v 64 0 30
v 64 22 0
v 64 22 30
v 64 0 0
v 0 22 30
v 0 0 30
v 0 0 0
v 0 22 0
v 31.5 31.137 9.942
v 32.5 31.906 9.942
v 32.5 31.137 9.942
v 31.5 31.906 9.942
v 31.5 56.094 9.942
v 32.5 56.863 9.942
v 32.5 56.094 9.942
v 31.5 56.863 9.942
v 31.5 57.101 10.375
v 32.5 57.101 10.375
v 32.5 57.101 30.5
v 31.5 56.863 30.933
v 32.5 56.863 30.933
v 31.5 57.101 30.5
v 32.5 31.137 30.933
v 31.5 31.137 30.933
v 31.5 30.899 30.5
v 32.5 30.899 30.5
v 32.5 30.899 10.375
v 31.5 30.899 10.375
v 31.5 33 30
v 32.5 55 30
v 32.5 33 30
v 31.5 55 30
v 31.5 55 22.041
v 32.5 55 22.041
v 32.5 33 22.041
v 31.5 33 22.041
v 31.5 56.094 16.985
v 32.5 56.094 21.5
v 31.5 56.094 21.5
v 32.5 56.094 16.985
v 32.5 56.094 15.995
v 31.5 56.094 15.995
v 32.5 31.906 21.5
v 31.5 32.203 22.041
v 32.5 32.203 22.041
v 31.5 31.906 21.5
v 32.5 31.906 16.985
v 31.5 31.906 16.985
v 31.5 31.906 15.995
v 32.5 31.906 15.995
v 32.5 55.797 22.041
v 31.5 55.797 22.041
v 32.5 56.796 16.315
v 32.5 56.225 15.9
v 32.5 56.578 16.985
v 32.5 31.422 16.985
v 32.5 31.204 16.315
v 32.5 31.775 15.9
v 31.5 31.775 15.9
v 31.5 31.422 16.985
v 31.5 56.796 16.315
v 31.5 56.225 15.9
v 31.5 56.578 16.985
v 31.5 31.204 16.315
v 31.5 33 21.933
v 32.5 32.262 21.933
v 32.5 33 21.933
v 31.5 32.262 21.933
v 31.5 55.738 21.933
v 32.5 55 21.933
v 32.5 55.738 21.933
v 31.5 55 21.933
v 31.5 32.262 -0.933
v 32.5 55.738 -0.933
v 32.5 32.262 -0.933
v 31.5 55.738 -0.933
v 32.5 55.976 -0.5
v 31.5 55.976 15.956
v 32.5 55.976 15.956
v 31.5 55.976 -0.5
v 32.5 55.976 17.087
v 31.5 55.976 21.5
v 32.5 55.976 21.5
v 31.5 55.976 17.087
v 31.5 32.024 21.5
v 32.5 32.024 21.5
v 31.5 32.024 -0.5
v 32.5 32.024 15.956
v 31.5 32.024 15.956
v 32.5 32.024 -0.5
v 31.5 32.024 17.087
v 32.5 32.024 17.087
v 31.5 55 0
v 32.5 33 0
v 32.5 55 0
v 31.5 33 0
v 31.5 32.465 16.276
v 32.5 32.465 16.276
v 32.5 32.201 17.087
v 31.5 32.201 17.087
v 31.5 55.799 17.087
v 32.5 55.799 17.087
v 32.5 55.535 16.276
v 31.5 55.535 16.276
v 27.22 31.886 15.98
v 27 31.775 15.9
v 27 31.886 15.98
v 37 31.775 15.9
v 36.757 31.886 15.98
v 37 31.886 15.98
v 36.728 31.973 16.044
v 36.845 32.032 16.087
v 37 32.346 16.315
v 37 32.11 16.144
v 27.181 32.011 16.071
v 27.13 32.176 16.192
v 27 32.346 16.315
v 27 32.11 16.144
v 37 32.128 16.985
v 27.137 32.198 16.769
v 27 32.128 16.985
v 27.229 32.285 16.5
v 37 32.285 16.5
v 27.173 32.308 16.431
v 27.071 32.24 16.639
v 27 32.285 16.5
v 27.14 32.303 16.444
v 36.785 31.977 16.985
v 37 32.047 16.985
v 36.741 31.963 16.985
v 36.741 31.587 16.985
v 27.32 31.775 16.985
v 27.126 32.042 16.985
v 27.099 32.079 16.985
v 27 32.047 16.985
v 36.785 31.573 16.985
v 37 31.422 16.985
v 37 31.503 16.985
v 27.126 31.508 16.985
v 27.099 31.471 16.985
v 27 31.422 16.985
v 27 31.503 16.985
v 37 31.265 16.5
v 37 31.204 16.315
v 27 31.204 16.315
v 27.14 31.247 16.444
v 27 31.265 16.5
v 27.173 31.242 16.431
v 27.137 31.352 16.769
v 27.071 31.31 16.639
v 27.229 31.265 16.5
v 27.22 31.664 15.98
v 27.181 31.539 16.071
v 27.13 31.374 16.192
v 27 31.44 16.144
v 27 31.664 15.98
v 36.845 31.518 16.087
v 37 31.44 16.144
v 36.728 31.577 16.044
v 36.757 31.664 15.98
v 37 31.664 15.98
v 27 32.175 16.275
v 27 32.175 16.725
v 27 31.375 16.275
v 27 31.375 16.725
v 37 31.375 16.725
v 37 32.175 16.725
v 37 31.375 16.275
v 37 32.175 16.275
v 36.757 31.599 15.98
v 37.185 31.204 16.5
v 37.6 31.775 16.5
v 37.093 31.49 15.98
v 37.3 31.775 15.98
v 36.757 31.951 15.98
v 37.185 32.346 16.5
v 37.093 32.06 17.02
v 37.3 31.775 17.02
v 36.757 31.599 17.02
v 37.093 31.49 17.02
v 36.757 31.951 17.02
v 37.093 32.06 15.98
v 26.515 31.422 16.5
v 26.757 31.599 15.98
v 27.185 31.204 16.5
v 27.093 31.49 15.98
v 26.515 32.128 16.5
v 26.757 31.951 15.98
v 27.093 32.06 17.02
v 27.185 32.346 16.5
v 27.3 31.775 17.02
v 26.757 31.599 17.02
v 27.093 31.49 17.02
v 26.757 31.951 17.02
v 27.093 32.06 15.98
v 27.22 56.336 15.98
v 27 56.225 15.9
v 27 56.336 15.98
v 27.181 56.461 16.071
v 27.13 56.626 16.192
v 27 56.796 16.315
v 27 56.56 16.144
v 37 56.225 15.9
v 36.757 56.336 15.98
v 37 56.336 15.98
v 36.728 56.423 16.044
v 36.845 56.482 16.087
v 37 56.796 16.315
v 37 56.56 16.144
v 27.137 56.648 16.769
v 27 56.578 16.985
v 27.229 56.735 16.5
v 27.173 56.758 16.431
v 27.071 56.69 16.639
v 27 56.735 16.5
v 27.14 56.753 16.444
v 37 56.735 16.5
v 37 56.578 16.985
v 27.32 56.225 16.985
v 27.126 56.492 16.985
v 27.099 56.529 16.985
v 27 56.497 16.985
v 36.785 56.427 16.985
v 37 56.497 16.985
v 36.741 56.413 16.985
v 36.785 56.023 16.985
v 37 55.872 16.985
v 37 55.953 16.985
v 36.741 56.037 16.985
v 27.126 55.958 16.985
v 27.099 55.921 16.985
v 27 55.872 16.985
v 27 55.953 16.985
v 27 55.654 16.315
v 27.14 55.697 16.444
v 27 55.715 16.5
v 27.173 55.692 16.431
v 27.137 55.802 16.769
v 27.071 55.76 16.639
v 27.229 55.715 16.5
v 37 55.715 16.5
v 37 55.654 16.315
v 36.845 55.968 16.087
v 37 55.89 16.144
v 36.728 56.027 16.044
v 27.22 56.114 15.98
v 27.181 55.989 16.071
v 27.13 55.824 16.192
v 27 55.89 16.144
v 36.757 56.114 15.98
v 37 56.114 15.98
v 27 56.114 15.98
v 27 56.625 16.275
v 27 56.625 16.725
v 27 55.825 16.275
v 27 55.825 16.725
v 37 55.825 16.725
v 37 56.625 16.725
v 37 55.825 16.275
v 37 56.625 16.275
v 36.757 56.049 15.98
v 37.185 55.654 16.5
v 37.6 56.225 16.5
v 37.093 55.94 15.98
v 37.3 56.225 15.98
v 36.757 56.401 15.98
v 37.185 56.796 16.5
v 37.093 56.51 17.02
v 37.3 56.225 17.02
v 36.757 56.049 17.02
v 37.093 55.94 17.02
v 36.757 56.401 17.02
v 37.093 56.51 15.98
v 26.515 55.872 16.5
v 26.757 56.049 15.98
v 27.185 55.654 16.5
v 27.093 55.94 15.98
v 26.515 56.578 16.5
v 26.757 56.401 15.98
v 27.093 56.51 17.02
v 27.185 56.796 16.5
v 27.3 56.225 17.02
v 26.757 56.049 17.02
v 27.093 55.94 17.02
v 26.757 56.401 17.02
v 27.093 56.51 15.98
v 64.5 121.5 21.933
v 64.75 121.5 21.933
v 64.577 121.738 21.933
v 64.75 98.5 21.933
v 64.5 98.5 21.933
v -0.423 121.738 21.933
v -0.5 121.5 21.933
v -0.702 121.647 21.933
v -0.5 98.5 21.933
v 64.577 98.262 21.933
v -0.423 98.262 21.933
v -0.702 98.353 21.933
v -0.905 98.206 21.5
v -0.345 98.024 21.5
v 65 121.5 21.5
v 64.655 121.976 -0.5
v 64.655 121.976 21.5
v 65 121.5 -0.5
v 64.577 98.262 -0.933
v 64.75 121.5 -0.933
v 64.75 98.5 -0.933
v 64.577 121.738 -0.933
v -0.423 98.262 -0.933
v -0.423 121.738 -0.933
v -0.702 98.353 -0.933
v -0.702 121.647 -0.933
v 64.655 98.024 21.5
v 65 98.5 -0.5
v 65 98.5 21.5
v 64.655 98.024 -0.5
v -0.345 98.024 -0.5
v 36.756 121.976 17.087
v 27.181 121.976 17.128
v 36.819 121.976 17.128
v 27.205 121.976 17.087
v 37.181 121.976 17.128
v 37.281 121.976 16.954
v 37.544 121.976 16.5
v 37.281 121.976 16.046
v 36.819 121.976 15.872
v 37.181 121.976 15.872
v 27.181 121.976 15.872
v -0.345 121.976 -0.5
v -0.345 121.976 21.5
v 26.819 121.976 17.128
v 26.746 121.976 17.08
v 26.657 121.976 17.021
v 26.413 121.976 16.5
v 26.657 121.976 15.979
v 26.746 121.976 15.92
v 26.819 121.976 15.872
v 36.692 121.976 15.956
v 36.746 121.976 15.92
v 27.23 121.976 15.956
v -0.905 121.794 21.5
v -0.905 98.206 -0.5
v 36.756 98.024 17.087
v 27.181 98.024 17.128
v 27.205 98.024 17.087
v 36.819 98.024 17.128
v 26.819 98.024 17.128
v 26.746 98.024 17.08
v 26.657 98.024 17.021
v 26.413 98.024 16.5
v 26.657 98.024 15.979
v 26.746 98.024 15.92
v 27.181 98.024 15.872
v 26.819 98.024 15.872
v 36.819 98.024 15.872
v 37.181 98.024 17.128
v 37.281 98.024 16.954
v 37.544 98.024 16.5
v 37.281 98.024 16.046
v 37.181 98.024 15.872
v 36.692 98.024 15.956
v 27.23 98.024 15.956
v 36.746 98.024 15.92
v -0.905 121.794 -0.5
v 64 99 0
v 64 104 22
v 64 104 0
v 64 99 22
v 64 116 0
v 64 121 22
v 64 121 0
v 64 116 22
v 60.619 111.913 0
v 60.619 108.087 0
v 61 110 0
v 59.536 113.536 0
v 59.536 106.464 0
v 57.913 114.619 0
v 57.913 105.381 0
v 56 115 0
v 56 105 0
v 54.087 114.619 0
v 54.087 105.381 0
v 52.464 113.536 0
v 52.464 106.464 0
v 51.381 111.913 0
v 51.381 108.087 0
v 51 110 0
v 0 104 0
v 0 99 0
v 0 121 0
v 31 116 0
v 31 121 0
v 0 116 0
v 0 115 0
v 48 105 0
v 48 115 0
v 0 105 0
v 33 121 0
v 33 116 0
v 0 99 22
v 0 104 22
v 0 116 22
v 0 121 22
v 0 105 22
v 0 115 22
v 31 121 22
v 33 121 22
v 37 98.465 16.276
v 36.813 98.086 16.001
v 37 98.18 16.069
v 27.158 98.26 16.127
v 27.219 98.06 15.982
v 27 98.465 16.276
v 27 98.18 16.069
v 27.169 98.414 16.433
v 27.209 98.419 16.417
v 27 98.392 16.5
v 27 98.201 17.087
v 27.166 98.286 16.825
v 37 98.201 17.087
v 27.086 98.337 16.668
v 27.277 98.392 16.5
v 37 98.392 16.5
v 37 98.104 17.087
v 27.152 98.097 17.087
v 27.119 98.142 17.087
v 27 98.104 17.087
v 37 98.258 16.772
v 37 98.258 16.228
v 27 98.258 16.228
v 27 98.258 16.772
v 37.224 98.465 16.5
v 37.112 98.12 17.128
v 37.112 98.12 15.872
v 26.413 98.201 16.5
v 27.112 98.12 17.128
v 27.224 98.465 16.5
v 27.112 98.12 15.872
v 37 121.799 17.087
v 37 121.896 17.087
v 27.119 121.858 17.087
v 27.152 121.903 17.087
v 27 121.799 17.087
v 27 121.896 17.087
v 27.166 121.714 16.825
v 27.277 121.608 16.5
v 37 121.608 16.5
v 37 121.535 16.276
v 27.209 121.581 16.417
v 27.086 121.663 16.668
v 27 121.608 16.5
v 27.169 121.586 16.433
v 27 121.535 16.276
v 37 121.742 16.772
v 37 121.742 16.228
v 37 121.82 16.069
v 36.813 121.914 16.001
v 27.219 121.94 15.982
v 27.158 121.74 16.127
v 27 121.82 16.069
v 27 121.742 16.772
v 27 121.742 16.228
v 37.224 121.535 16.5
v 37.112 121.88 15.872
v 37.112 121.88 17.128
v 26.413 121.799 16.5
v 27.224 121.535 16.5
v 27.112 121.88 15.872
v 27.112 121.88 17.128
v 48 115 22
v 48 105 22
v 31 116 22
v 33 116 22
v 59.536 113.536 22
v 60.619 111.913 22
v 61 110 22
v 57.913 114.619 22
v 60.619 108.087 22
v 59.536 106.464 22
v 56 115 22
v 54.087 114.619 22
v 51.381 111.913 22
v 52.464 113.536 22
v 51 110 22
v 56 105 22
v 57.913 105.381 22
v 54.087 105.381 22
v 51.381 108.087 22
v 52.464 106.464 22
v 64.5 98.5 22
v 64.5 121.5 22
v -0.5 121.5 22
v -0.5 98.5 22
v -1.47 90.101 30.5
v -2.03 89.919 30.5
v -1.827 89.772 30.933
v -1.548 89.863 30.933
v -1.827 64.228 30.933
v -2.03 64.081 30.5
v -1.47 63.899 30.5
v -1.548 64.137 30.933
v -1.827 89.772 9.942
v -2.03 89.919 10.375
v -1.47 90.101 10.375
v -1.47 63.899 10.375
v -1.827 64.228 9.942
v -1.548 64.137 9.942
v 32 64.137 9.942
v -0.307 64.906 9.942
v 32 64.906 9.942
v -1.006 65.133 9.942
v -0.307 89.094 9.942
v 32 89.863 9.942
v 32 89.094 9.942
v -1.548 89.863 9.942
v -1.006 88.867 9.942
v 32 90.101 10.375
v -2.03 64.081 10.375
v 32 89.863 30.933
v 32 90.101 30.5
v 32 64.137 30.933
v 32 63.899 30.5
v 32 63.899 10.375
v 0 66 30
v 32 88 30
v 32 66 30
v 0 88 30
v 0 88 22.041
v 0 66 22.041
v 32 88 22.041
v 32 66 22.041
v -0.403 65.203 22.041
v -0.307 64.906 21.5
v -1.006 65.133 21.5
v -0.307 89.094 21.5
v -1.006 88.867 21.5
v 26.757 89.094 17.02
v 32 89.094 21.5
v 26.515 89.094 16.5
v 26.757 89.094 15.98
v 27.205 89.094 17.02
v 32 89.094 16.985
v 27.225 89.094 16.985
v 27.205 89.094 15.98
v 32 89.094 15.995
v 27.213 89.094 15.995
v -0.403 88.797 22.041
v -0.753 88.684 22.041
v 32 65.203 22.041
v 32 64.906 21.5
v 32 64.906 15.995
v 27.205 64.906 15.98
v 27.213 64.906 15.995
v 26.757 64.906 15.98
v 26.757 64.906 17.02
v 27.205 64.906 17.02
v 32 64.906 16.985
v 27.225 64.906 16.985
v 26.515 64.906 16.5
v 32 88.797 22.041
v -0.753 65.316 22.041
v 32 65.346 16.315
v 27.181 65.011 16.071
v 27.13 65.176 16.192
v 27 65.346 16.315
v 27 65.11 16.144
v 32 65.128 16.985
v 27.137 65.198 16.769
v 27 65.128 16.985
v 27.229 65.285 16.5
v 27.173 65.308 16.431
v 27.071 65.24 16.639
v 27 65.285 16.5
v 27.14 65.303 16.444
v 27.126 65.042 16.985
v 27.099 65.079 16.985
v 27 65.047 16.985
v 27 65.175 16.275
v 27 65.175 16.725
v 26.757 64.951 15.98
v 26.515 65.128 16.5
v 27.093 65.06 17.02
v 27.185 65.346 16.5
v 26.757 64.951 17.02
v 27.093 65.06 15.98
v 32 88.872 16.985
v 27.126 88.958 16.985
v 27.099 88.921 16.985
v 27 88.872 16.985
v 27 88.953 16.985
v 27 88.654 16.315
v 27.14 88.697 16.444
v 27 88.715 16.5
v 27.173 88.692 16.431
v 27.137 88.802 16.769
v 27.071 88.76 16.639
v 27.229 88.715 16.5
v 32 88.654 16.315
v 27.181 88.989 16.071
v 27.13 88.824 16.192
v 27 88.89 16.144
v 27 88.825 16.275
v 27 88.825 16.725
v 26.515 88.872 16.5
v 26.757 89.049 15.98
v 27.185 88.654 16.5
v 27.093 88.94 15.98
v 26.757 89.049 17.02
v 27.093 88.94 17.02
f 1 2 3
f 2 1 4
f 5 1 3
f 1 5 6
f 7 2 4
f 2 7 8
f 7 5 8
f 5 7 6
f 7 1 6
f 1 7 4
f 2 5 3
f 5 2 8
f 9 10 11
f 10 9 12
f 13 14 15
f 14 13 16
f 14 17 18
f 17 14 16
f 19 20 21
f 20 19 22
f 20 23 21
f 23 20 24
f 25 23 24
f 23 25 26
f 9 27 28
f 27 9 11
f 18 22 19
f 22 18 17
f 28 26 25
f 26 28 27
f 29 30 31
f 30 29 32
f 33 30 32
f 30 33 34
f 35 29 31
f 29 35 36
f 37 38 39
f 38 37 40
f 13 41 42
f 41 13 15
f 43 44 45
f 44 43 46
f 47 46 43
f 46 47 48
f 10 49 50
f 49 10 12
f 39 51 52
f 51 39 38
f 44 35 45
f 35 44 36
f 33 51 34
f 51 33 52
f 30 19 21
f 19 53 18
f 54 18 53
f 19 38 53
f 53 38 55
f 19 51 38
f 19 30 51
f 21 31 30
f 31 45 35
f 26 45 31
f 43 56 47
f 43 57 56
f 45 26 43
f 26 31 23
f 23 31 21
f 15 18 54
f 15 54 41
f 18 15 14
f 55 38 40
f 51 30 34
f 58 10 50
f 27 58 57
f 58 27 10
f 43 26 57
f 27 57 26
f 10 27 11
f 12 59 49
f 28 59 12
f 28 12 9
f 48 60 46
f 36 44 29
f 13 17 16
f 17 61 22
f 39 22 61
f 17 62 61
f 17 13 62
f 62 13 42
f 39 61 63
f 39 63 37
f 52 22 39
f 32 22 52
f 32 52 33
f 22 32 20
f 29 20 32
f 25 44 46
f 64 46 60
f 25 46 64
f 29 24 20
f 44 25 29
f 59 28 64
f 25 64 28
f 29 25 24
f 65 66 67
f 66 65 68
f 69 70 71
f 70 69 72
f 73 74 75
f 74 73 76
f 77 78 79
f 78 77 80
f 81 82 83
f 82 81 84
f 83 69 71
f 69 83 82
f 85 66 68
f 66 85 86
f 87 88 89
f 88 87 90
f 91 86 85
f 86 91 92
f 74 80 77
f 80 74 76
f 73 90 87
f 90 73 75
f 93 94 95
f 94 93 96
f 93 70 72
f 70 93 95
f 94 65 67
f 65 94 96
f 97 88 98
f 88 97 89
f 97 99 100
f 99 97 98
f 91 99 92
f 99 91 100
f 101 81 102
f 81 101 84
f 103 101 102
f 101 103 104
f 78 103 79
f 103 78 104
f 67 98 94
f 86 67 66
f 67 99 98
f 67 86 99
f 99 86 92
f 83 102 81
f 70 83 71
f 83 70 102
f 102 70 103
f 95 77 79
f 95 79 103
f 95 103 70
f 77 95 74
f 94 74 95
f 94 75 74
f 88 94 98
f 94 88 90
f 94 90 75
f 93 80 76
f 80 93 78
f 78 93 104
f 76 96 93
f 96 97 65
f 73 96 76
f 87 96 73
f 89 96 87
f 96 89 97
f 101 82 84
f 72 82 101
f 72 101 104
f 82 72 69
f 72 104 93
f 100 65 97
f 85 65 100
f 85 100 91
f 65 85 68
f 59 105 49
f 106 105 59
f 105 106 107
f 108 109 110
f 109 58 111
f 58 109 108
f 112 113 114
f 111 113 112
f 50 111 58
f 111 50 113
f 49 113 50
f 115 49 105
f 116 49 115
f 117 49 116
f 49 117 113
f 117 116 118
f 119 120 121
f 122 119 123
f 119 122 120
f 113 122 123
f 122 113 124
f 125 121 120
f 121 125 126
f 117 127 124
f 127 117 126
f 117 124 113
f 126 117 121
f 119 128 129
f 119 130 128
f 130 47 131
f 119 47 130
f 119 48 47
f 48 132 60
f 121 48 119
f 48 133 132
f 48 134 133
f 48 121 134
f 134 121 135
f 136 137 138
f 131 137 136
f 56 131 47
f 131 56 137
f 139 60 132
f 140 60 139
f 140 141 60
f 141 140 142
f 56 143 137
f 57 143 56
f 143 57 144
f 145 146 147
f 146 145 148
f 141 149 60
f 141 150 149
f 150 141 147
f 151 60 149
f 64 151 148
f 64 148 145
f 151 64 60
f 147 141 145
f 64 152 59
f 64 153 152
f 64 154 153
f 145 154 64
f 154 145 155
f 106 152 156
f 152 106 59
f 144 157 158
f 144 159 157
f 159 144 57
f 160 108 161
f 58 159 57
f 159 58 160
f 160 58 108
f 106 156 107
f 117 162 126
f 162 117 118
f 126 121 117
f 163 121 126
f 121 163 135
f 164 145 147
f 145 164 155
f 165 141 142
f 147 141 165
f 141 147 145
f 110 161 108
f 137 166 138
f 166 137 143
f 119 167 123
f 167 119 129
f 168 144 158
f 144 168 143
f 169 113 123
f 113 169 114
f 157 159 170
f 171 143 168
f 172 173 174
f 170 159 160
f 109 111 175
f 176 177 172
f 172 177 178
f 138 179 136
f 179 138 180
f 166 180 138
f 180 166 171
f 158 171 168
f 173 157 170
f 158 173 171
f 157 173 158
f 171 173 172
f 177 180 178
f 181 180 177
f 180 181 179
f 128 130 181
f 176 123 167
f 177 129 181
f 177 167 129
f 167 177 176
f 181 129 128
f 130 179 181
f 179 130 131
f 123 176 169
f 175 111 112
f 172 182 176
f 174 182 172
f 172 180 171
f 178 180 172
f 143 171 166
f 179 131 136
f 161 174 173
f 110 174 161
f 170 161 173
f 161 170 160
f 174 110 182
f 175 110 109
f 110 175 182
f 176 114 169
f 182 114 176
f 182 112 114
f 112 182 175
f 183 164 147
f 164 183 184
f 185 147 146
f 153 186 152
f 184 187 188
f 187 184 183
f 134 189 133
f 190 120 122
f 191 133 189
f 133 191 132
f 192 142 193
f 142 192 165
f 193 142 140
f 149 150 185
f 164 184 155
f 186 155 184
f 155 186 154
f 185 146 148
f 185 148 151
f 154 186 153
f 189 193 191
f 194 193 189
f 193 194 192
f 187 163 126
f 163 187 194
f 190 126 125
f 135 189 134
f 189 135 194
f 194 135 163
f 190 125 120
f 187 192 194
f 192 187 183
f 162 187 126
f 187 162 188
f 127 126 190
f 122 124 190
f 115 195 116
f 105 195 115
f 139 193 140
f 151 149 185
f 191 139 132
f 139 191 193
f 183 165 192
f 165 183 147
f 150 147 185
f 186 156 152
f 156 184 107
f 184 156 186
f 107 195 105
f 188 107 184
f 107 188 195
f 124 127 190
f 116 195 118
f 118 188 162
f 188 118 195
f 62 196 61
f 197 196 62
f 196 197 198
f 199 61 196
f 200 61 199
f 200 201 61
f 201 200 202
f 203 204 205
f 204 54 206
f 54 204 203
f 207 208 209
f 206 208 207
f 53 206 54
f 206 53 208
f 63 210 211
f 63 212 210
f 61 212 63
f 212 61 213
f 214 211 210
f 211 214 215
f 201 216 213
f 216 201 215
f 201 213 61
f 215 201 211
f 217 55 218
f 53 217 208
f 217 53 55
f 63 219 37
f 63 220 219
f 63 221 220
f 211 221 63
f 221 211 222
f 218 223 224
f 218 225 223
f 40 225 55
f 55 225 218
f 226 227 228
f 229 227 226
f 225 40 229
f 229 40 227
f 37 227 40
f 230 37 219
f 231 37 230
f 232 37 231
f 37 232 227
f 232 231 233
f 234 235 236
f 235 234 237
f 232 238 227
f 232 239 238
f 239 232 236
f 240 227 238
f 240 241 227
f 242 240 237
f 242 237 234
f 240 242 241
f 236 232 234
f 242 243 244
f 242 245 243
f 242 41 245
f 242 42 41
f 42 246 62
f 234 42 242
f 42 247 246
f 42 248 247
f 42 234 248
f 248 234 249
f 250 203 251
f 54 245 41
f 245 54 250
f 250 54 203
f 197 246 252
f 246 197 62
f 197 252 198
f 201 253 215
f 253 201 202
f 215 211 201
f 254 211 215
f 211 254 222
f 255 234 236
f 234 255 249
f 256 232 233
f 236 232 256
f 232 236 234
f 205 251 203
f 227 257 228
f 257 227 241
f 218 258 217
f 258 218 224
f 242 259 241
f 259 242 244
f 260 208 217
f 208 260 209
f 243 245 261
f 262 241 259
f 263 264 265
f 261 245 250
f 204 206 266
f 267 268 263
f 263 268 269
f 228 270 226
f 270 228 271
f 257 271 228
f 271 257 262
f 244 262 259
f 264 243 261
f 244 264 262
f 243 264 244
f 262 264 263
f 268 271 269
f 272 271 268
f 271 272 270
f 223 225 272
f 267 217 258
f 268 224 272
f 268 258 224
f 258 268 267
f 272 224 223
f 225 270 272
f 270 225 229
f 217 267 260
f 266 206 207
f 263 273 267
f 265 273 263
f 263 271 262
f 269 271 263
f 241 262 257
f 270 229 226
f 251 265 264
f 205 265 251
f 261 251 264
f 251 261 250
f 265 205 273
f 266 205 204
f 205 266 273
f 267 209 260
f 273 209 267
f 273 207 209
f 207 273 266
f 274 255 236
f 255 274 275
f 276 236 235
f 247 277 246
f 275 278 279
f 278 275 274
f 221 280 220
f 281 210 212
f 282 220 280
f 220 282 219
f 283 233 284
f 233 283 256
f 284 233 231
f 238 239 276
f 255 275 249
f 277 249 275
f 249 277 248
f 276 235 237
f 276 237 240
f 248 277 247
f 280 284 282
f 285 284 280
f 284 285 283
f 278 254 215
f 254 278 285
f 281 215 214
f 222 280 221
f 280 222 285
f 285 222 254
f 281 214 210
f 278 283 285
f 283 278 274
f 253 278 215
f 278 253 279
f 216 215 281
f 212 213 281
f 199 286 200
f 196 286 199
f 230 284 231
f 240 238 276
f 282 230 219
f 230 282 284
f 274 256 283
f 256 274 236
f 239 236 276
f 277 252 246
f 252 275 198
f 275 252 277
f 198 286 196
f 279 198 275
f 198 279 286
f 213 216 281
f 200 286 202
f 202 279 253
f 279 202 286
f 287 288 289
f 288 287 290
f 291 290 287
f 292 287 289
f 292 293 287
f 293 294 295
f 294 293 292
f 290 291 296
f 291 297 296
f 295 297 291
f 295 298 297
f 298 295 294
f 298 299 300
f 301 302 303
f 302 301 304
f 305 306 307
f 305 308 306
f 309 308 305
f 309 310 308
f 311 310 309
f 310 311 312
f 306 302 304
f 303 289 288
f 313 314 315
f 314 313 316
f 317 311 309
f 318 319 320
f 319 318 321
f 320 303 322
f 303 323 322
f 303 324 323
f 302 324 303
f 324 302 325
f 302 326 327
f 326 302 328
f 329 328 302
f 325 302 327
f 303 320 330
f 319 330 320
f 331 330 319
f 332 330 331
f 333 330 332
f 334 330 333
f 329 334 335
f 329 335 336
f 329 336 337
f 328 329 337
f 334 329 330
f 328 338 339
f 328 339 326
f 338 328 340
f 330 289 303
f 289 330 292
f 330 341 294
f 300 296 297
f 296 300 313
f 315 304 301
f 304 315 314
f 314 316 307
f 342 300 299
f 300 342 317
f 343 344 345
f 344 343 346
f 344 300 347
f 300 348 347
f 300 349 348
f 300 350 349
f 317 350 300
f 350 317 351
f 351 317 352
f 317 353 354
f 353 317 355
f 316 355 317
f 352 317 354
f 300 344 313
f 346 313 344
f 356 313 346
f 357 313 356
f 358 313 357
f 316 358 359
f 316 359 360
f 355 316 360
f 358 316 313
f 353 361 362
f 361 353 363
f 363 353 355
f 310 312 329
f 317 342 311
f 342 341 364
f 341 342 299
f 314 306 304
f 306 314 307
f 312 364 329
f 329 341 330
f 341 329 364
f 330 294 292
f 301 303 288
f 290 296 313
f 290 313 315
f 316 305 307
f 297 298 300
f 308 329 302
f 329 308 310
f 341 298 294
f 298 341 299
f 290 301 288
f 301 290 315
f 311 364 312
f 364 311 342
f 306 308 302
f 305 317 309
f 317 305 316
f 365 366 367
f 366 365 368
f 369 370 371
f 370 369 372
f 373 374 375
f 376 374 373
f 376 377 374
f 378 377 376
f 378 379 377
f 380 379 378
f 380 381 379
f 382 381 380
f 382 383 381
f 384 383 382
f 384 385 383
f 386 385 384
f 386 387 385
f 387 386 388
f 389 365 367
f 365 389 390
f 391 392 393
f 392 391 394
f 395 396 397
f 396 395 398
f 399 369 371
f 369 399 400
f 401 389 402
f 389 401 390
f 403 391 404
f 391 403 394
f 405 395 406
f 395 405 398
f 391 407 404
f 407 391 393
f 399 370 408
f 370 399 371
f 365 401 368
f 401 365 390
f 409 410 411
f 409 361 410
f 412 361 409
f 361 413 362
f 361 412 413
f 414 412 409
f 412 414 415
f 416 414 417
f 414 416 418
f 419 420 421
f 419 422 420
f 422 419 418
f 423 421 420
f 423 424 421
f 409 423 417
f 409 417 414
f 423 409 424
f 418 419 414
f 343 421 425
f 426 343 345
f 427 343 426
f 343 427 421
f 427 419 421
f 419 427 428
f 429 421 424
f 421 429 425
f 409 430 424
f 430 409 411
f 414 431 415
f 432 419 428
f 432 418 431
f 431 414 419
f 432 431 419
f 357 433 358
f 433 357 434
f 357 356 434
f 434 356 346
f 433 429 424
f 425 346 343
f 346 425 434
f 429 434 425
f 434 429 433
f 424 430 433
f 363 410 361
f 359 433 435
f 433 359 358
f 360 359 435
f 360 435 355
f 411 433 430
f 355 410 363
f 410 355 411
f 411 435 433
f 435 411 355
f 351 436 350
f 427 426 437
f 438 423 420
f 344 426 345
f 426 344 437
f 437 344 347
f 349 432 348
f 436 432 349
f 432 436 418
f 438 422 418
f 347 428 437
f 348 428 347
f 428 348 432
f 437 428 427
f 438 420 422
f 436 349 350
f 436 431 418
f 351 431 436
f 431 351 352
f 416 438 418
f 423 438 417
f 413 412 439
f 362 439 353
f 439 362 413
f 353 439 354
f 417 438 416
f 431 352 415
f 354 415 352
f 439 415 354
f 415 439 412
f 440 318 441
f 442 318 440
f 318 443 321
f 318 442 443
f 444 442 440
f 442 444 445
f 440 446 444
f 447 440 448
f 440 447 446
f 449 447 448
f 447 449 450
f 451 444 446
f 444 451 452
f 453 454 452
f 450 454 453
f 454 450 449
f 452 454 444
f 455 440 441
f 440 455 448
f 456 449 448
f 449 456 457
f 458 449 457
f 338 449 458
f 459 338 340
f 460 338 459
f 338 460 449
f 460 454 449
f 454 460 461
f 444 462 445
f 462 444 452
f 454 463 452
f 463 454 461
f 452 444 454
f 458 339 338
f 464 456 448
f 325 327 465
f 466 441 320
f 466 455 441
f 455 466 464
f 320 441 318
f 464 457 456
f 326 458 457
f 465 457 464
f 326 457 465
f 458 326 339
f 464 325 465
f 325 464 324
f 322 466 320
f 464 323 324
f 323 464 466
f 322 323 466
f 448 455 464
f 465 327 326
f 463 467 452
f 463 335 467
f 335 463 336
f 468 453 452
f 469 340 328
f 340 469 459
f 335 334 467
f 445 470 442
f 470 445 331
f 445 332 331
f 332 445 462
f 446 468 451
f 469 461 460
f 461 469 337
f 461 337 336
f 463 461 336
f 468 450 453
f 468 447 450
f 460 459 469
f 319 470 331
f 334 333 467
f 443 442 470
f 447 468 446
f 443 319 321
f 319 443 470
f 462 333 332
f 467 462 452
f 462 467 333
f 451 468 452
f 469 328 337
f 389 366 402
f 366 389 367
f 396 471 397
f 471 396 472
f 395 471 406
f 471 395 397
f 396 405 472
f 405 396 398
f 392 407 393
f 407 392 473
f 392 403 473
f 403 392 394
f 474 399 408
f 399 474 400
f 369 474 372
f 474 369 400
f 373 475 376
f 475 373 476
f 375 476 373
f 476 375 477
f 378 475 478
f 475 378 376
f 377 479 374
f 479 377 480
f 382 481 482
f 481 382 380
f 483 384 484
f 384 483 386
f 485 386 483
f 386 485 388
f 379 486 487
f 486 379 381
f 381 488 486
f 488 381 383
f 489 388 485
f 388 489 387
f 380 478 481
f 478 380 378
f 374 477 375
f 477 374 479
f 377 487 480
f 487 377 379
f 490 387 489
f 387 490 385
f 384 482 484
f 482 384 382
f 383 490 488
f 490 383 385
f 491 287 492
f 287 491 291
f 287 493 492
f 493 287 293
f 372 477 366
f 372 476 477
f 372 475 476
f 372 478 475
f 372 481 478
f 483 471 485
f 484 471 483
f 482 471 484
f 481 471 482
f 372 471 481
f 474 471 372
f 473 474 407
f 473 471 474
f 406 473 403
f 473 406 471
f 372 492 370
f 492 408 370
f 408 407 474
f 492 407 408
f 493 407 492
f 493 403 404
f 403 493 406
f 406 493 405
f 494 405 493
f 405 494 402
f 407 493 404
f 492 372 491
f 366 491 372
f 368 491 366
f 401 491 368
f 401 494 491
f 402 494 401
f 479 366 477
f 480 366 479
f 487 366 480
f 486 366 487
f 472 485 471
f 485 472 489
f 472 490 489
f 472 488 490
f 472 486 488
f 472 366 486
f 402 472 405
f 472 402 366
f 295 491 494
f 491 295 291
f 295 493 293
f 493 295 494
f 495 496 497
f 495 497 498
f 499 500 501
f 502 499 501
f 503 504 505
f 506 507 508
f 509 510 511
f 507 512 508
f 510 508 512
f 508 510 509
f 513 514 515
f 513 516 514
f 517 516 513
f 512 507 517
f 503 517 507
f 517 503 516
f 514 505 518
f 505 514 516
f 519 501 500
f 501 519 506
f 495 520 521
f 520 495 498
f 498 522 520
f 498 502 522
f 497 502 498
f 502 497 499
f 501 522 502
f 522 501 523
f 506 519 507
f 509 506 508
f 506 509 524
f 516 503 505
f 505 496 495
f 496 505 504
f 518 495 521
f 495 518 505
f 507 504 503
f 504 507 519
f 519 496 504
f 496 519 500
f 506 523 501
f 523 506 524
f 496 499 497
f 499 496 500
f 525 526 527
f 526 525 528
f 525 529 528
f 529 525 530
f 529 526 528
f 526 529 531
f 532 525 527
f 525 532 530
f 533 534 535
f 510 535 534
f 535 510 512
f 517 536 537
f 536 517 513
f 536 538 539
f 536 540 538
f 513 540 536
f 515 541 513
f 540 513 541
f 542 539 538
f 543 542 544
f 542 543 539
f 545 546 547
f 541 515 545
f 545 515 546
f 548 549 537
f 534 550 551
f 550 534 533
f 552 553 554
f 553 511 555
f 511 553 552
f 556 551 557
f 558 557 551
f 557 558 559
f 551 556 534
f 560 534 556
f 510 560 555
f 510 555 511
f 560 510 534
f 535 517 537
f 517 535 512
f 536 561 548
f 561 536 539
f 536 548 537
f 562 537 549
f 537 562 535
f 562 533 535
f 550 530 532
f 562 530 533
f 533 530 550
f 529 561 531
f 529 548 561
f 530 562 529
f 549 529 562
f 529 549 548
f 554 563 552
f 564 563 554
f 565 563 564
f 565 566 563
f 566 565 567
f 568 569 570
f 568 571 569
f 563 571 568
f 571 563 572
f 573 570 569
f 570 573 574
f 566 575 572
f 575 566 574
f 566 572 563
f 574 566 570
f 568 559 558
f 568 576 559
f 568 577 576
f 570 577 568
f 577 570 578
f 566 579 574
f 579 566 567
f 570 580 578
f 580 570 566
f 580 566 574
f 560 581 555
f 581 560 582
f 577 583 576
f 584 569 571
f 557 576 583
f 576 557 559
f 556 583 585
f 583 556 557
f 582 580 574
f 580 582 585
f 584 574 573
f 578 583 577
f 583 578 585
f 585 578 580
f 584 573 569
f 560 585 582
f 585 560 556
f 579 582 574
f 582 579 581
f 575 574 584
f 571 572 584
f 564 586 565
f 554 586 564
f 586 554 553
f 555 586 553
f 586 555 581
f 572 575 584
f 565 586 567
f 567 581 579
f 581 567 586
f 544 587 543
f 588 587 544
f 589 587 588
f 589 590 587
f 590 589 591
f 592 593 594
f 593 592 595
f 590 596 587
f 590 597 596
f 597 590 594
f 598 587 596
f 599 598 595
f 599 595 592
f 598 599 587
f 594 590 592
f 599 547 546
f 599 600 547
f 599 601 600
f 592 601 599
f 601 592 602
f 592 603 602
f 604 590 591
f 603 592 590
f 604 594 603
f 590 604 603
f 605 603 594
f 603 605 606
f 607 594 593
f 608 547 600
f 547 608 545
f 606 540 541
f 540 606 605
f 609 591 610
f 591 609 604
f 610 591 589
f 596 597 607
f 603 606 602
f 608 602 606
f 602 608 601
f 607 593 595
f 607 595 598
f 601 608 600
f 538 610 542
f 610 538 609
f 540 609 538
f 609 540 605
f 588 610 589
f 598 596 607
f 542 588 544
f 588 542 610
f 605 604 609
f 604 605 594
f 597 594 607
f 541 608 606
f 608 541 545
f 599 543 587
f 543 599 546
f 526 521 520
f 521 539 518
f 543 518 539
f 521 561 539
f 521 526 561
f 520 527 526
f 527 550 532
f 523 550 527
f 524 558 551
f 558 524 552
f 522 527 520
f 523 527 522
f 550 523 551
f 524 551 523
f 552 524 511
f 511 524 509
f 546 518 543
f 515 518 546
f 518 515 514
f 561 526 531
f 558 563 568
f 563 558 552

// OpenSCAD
// file: 05_locker.scad
include <00_main.scad>;

use <03_first_shell.scad>;
use <04_second_shell.scad>;


module _pill_core_locker(offset=0) {
    rotate([0,90,0])
    cylinder(h=locker_x, r=locker_r+offset, center=true);
}

module 05_pill_locker(offset=0) {    
    _pill_core_locker(offset);
    
    translate([locker_x/2,0,0])
    sphere(r=locker_r+offset);
    
    translate([-locker_x/2,0,0])
    sphere(r=locker_r+offset);
}


module 05_pill_locker_mid_position(with_offset=false) {
    mid_overlay = size_z * (1 - top_overlay + (top_overlay - top_part)/2);
    offset_val = with_offset ? second_shell_offset : 0;
    shift_y = second_shell_offset + size_wall + locker_y;

    translate([
        size_x/2,
        -shift_y,
        mid_overlay])
    05_pill_locker(offset=offset_val);
    
    translate([
        size_x/2,
        size_y + shift_y,
        mid_overlay])
    05_pill_locker(offset=offset_val);
}


// DEVELOPING ################################

module 05_slide_with_locker() {
    size_debug = size_wall * 10;
    alpha_debug = 0.5;

    intersection() {
        04_second_shell();
        01_debug_slice();
    }

    intersection() {
        difference() {
            03_first_shell();
            05_pill_locker_mid_position(with_offset=true);
        }
        01_debug_slice();
    }

    intersection() {
        translate([0,0,0]);
        05_pill_locker();
        01_debug_slice();
    }

    05_pill_locker_mid_position();
}

module 05_developing() {
    debug_shift = 10;
    steps = 4;  // decrease step number for better understanding

    translate([0, - (steps - 0) * (debug_shift * 1.5), 0]) {
        _pill_core_locker();
    }

    translate([0, - (steps - 1) * (debug_shift * 1.5), 0]) {
        05_pill_locker();
    }

    translate([0, - (steps - 2) * (debug_shift * 1.5), 0]) {
        05_pill_locker(offset=0.1);
    }

    translate([0, - (steps - 3) * (debug_shift * 1.5), 0]) {
        tmp = 0.1;
        
        difference() {
            #cube([6,2,2]);
            05_pill_locker(offset=tmp);
        }
        
        intersection() {
            cube([6,2,2]);
            05_pill_locker();
        }
    }

    translate([0, - (steps - 4) * (debug_shift * 1.5), 0]) {
        05_slide_with_locker();
    }

}

// Do not forget put all structures under a comment in 00_main.scad
05_developing();
// file: 04_second_shell.scad
include <00_main.scad>;
use <03_first_shell.scad>;

// next line is a debug_line - uncomment to use
// second_shell_cutted_top = false; //rewrite var from 00_main


module _secord_core_shell() {
    if (second_shell_cutted_top) {
        difference() {
            translate([0,0,size_z*(1-top_overlay)])
            scale([1,1,top_overlay])
            01_min_vol();

            translate([
                -size_x/4,
                -size_y/4,
                size_z - second_shell_offset - size_wall
            ])
            scale([1.5, 1.5, 1])
            01_min_vol();
        }
    } else {
        translate([0,0,size_z*(1-top_overlay)])
        scale([1,1,top_overlay])
        01_min_vol();
    }
}

module _secord_core_offset_shell() {
    minkowski() {
       _secord_core_shell();
       cube(second_shell_offset*2, center = true); 
    }
}

module _second_solid_shell() {
    minkowski() {
        _secord_core_offset_shell();
        cube(size_wall*3, center = true);
        sphere(d=size_wall);
    }
}

module _second_pre_shell() {
    difference() {
        _second_solid_shell();
        01_min_vol();
    }
}

module 04_second_shell() {
    difference() {
        _second_pre_shell();
        03_first_solid_shell(second_shell_offset);
    }
}

module 04_slide() {
    size_debug = size_wall * 10;
    alpha_debug = 0.5;

    intersection() {
        04_second_shell();
        01_debug_slice();
    }

    intersection() {
        03_first_shell();
        01_debug_slice();
    }

    // RED - first shell
    translate([size_x/2,0,size_z])
    color([1,0,0,alpha_debug])
    cube([size_debug,size_debug,size_wall]);

    if (!second_shell_cutted_top) {
        // GREEN - second_shell_offset
        translate([size_x/2+size_wall,-size_wall,size_z+size_wall])
        color([0,1,0,alpha_debug])
        cube([size_debug,size_debug,second_shell_offset]);

        // BLUE - second shell
        translate([size_x/2+size_wall*2,-size_wall*2,size_z+size_wall+second_shell_offset])
        color([0,0,1,alpha_debug])
        cube([size_debug,size_debug,size_wall]);
    }
}

// DEVELOPING ################################

module 04_developing() {
    steps = 6;  // decrease step number for better understanding

    translate([0, - (steps - 0) * (size_y * 1.5), 0]) {
        #01_min_vol();
    }

    translate([0, - (steps - 1) * (size_y * 1.5), 0]) {
        _secord_core_shell();
        #01_min_vol();
    }

    translate([0, - (steps - 2) * (size_y * 1.5), 0]) {
        _secord_core_offset_shell();
        #01_min_vol();
    }

    translate([0, - (steps - 3) * (size_y * 1.5), 0]) {
        _second_solid_shell();
    }

    translate([0, - (steps - 4) * (size_y * 1.5), 0]) {
        _second_pre_shell();
    }

    translate([0, - (steps - 5) * (size_y * 1.5), 0]) {
        04_second_shell();
    }

    translate([0, - (steps - 6) * (size_y * 1.5), 0]) {
        04_slide();   
    }
}

// Do not forget put all structures under a comment in 00_main.scad
04_developing();
// file: 03_first_shell.scad
include <00_main.scad>;
use <01_shared.scad>;
use <02_internal_walls.scad>;


module 03_first_solid_shell(second_shell_offset=0) {
    minkowski() {
        01_min_bottom_vol();
        cube(size_wall, center = true);
        sphere(d=size_wall+second_shell_offset*2);
    }
}

module 03_first_shell() {
    difference(){
        03_first_solid_shell();
        01_min_vol();
    }
}


// DEVELOPING ################################

module 03_developing() {
    steps = 5;  // decrease step number for better understanding

    translate([0, - (steps - 0) * (size_y * 1.5), 0]) {
        #01_min_vol();
    }

    translate([0, - (steps - 1) * (size_y * 1.5), 0]) {
        #01_min_vol();
        01_min_bottom_vol();
    }

    translate([0, - (steps - 2) * (size_y * 1.5), 0]) {
        03_first_solid_shell();
    }

    translate([0, - (steps - 3) * (size_y * 1.5), 0]) {
        03_first_shell();
    }

    translate([0, - (steps - 4) * (size_y * 1.5), 0]) {
        02_internal_walls();
    }

    translate([0, - (steps - 5) * (size_y * 1.5), 0]) {
        union() {
            03_first_shell();
            02_internal_walls();
        }
    }
}

// Do not forget put all structures under a comment in 00_main.scad
03_developing();
// file: 02_internal_walls.scad
include <00_main.scad>;
use <01_shared.scad>;


module _min_vol_n_half_wall() {
    minkowski() {
        union() {
            01_min_bottom_vol();
            translate([0,0,size_wall/2])
            01_min_bottom_vol();
        }
        cube(size_wall, center = true);
    }
}

module 02_internal_walls() {
    difference() {
        _min_vol_n_half_wall();
        00_initial_forms();
    }
}


// DEVELOPING ################################

module 02_developing() {
    steps = 3;  // decrease step number for better understanding

    translate([0, - (steps - 0) * (size_y * 1.5), 0]) {
        00_initial_forms();
        #01_min_vol();
    }

    translate([0, - (steps - 1) * (size_y * 1.5), 0]) {
        01_min_bottom_vol();
    }

    translate([0, - (steps - 2) * (size_y * 1.5), 0]) {
        _min_vol_n_half_wall();
    }

    translate([0, - (steps - 3) * (size_y * 1.5), 0]) {
        02_internal_walls();
    }
}

// Do not forget put all structures under a comment in 00_main.scad
02_developing();
// file: 06_assembling.scad
include <00_main.scad>;

use <02_internal_walls.scad>
use <03_first_shell.scad>;
use <04_second_shell.scad>;
use <05_locker.scad>;

module 05_first_final_shell() {
    if (with_locker) {
        difference() {
            03_first_shell();
            05_pill_locker_mid_position(with_offset=true);
        }
    }
    else {
        03_first_shell();
    }
    02_internal_walls();
}

module 05_second_final_shell() {
    04_second_shell();
    if (with_locker) {
        05_pill_locker_mid_position(with_offset=false);
    }
}

module 05_preview() {
    00_initial_forms(); #01_min_vol();

    translate([0, size_y * 1.5, 0])
    if (with_locker) {
        05_slide_with_locker();
    } else {
        04_slide();
    }

    translate([0, size_y * 4.5, 0])
    05_first_final_shell();

    translate([0, size_y * 3, 0])
    intersection(){
        05_second_final_shell();
        cube([size_x,size_y*3,size_z*3], center=true);
    }
}


// DEVELOPING ################################

module 05_developing() {    
    05_first_final_shell();

    mirror([0, 0, 1])
    translate([0,size_y*1.5,-size_z])
    05_second_final_shell();
}

// Do not forget put all structures under a comment in 00_main.scad
05_developing();
// file: 00_main.scad
use <01_shared.scad>;
use <06_assembling.scad>;


// PART_0 ################################

module 00_initial_forms() {
translate([0,0,0]) 
cube([64,5,30]);

translate([0,6,0])
cube([48,10,30]);

translate([0,17,0])
cube([31,5,30]);

translate([31 + 2,17,0])
cube([31,5,30]);
    
translate([56,11,0])
cylinder(30, r=5);
}


//00_initial_forms();


// PART_1 ################################

size_x = 64;
size_y = 22; 
size_z = 30;


//00_initial_forms(); #01_min_vol();


// PART_2 ################################

size_wall = 1;
second_shell_offset = 0.125;

top_part = 0.3;
top_overlay = 0.6;
second_shell_cutted_top = true;

with_locker = true;
locker_x = 10;
locker_r = 0.6;
locker_y = 0.1;


05_preview();


// PART_3 ################################

//$fn=60; 05_first_final_shell();
//$fn=60; 05_second_final_shell();
// main file
include <00_main.scad>;


module 01_min_vol() {
    cube([size_x,size_y,size_z]);
}

module 01_min_bottom_vol() {
    scale([1,1,1 - top_part])
    01_min_vol();
}

module 01_debug_slice() {
    translate([size_x/2,-size_wall*3,-size_wall*3])
    cube([size_wall, size_y*3, size_z*3], center = true);
}
